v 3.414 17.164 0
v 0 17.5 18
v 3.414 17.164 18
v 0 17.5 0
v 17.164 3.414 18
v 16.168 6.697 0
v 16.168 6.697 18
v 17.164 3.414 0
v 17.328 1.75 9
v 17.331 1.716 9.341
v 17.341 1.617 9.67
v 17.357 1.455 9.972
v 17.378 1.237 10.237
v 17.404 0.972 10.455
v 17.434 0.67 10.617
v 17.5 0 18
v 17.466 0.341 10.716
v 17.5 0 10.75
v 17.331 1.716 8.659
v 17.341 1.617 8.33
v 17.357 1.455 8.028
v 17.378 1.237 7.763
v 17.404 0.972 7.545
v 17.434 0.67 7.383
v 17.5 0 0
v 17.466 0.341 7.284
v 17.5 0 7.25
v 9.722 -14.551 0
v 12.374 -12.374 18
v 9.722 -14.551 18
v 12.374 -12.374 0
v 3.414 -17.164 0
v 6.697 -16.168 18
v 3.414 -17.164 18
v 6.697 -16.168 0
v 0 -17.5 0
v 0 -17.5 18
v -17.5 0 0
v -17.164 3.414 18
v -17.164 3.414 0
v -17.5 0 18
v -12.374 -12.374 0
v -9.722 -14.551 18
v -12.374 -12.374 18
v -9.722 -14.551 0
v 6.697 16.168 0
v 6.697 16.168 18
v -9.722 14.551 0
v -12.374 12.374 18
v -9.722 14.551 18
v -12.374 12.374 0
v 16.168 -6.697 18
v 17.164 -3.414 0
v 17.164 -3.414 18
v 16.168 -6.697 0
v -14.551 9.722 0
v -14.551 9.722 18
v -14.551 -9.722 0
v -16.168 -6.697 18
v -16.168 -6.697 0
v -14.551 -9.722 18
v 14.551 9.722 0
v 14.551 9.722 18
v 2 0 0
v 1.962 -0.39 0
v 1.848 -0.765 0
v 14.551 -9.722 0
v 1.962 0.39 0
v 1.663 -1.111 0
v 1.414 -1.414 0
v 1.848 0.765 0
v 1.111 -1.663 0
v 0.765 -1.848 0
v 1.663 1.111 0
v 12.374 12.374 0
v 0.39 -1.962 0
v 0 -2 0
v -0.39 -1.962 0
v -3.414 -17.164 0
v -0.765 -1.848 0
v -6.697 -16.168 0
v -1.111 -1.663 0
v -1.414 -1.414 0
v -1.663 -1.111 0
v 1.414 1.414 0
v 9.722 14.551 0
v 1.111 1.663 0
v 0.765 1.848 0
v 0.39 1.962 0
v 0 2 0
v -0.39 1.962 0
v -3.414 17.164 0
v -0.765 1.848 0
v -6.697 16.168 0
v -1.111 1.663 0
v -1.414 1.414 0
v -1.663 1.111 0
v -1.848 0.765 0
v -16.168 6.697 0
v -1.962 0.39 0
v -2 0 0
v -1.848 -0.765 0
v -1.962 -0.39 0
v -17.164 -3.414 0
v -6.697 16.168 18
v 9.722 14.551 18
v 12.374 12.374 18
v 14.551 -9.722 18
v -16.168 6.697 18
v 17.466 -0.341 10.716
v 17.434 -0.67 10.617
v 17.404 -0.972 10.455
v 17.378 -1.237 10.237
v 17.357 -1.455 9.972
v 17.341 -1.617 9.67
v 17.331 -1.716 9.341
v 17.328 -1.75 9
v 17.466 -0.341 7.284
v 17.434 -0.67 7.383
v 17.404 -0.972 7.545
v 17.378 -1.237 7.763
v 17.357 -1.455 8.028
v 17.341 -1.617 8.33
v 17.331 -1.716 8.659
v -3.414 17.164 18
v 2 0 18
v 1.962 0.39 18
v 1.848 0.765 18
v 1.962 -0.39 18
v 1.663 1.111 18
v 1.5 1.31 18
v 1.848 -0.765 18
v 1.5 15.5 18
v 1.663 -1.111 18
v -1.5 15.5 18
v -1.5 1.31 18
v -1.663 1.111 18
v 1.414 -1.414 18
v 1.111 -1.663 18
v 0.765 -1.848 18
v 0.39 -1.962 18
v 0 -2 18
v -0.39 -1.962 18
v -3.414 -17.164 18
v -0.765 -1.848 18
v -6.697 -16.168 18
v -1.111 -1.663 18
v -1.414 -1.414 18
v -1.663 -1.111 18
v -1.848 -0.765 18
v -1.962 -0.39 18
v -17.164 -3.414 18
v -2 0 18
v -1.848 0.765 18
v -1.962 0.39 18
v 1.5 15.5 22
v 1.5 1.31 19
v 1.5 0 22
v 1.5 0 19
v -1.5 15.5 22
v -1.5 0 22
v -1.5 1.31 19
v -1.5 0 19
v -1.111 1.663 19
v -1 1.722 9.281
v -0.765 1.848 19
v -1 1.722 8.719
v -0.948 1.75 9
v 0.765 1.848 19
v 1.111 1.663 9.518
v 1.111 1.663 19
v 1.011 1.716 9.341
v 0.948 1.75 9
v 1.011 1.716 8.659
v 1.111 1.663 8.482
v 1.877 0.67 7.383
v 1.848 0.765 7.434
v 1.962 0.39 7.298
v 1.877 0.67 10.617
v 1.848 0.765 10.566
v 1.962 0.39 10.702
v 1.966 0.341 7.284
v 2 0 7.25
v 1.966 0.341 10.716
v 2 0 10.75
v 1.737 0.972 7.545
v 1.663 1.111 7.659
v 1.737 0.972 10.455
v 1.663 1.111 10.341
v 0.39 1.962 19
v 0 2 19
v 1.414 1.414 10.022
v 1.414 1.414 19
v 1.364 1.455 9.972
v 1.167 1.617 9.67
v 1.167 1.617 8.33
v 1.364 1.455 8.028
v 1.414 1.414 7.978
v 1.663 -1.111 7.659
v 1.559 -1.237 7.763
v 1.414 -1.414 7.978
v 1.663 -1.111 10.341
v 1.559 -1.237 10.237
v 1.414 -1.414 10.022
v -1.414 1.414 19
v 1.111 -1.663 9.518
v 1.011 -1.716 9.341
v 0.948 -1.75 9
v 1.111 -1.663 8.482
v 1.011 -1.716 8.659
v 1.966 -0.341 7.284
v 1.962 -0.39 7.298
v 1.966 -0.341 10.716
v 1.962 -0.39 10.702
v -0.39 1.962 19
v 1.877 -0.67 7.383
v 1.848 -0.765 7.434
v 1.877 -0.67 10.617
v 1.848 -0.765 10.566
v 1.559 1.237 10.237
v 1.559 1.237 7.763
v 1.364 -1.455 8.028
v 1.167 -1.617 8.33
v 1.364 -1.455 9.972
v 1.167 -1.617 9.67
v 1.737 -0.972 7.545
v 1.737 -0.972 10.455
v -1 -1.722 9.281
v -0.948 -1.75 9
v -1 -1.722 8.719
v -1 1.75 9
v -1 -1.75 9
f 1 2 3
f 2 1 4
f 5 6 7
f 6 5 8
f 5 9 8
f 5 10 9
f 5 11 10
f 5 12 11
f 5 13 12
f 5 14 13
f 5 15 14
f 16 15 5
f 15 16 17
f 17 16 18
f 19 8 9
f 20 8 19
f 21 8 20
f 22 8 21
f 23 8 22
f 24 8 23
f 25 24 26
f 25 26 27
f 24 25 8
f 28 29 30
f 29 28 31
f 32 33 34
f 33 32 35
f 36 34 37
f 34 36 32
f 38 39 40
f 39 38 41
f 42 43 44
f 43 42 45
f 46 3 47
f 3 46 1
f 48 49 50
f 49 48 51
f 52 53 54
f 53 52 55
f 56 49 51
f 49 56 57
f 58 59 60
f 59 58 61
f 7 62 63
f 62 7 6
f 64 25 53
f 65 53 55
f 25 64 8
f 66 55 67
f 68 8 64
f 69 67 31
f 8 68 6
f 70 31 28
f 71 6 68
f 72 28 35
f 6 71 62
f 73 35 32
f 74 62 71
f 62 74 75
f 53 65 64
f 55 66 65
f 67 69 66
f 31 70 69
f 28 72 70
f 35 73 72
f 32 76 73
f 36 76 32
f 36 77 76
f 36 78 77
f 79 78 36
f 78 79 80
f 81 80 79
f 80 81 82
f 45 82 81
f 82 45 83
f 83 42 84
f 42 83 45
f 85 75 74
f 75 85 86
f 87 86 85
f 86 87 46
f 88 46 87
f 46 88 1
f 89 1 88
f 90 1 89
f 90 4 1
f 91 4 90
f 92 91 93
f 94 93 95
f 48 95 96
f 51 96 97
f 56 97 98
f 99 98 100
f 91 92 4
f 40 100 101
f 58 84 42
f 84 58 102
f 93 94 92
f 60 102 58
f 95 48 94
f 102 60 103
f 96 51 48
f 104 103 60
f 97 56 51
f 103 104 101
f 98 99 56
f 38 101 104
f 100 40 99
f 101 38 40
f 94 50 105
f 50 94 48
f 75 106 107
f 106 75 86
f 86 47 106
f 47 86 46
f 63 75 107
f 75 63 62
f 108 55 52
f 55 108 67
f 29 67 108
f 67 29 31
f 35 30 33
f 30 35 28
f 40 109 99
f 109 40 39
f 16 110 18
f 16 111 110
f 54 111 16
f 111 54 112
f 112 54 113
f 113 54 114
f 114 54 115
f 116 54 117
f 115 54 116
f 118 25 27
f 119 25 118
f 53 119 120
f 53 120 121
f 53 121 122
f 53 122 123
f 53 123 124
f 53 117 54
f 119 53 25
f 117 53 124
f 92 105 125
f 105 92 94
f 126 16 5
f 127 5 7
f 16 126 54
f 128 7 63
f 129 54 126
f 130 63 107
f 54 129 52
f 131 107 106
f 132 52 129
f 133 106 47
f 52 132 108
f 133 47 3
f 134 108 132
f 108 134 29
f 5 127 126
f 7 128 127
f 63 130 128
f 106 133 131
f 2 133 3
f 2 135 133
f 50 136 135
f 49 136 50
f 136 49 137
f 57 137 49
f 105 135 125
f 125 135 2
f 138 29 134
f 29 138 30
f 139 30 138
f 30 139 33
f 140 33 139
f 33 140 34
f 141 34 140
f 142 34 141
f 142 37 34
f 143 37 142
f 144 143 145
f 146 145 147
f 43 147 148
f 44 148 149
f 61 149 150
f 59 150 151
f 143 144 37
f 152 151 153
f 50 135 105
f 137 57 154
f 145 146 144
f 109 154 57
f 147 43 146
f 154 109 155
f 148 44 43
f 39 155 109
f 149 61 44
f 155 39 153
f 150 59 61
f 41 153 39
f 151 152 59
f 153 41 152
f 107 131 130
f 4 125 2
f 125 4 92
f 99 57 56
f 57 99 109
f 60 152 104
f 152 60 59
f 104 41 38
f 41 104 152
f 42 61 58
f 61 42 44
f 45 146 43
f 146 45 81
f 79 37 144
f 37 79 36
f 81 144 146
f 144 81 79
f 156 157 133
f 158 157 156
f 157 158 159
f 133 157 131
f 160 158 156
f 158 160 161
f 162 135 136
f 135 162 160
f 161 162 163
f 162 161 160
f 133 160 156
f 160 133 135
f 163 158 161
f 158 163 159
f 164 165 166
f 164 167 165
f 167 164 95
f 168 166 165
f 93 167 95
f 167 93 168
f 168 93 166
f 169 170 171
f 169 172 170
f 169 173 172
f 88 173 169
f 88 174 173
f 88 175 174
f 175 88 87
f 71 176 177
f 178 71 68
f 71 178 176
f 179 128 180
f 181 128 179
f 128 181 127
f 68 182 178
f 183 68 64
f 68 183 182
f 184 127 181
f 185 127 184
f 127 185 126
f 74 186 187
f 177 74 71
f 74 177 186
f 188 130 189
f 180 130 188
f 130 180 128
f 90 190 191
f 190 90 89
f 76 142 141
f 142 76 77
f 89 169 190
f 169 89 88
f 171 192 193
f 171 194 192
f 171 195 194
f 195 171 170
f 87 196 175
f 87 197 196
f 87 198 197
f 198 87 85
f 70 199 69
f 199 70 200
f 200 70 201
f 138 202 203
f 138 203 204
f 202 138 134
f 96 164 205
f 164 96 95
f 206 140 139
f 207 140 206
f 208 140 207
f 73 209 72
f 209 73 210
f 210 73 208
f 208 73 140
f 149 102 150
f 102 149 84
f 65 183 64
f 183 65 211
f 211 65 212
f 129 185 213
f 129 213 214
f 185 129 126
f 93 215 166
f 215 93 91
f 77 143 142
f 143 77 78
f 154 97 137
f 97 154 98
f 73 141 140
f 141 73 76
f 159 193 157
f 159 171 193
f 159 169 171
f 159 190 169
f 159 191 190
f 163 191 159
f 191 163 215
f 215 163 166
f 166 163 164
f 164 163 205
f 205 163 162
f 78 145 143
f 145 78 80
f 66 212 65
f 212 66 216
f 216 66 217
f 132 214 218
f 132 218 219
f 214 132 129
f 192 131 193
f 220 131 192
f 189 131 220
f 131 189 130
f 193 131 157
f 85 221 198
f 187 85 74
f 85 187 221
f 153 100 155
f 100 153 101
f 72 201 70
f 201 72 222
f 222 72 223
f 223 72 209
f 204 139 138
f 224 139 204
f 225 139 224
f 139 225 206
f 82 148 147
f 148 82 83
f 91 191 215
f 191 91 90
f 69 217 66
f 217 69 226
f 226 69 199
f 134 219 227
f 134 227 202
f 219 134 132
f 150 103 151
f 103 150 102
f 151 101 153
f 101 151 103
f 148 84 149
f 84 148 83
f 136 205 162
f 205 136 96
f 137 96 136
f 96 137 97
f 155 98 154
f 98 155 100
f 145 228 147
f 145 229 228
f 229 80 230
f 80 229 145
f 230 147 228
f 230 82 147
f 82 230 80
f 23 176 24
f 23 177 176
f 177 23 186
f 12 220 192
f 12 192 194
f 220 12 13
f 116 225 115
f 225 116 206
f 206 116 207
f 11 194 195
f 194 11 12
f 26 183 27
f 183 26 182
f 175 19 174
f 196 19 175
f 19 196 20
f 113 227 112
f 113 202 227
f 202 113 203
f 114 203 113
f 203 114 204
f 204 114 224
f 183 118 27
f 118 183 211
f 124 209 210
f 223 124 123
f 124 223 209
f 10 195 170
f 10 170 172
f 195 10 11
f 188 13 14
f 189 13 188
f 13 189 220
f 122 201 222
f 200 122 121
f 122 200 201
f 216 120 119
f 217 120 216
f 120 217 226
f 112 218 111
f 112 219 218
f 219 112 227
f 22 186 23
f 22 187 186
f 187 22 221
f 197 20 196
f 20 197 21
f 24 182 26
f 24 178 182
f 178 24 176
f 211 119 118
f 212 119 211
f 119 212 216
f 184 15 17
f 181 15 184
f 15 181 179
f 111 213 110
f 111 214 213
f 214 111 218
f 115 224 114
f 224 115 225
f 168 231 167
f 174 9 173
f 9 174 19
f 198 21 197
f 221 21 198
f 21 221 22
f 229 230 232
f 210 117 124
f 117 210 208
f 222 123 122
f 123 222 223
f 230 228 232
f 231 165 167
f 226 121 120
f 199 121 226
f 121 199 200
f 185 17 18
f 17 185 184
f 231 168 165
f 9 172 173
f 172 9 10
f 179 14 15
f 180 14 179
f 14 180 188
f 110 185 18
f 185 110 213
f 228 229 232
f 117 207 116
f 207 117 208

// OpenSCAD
$fn = 32;

// ----------------------------------------------------------------------
// Control knob: pointer knob
// ----------------------------------------------------------------------

// --- parameters (mm) ---
rib_w = 3;                // pointer rib width
rib_h = 5;                // pointer rib height
knob_d = 35;              // knob body diameter
knob_h = 18;              // knob body height
bore_d = 4;               // shaft bore diameter
set_d = 3.5;              // set screw bore diameter
fit_tol = 0.1;            // tolerance for press fits, mm
free_tol = 0.5;           // tolerance for clearance fits, mm

rib_poke = rib_h - 1;  // rib height above the top
total_h = knob_h + rib_h - 1;  // overall height

difference() {
  union() {
    cylinder(h = knob_h, d = knob_d);
    translate([-rib_w / 2, 0, knob_h - 1])
      cube([rib_w, knob_d / 2 - 2, rib_h]);
  }
  translate([0, 0, -1]) cylinder(h = knob_h + 2, d = bore_d);
  translate([-1, 0, knob_h / 2]) rotate([0, 90, 0])
    cylinder(h = knob_d / 2 + bore_d / 2 + 2, d = set_d);}
